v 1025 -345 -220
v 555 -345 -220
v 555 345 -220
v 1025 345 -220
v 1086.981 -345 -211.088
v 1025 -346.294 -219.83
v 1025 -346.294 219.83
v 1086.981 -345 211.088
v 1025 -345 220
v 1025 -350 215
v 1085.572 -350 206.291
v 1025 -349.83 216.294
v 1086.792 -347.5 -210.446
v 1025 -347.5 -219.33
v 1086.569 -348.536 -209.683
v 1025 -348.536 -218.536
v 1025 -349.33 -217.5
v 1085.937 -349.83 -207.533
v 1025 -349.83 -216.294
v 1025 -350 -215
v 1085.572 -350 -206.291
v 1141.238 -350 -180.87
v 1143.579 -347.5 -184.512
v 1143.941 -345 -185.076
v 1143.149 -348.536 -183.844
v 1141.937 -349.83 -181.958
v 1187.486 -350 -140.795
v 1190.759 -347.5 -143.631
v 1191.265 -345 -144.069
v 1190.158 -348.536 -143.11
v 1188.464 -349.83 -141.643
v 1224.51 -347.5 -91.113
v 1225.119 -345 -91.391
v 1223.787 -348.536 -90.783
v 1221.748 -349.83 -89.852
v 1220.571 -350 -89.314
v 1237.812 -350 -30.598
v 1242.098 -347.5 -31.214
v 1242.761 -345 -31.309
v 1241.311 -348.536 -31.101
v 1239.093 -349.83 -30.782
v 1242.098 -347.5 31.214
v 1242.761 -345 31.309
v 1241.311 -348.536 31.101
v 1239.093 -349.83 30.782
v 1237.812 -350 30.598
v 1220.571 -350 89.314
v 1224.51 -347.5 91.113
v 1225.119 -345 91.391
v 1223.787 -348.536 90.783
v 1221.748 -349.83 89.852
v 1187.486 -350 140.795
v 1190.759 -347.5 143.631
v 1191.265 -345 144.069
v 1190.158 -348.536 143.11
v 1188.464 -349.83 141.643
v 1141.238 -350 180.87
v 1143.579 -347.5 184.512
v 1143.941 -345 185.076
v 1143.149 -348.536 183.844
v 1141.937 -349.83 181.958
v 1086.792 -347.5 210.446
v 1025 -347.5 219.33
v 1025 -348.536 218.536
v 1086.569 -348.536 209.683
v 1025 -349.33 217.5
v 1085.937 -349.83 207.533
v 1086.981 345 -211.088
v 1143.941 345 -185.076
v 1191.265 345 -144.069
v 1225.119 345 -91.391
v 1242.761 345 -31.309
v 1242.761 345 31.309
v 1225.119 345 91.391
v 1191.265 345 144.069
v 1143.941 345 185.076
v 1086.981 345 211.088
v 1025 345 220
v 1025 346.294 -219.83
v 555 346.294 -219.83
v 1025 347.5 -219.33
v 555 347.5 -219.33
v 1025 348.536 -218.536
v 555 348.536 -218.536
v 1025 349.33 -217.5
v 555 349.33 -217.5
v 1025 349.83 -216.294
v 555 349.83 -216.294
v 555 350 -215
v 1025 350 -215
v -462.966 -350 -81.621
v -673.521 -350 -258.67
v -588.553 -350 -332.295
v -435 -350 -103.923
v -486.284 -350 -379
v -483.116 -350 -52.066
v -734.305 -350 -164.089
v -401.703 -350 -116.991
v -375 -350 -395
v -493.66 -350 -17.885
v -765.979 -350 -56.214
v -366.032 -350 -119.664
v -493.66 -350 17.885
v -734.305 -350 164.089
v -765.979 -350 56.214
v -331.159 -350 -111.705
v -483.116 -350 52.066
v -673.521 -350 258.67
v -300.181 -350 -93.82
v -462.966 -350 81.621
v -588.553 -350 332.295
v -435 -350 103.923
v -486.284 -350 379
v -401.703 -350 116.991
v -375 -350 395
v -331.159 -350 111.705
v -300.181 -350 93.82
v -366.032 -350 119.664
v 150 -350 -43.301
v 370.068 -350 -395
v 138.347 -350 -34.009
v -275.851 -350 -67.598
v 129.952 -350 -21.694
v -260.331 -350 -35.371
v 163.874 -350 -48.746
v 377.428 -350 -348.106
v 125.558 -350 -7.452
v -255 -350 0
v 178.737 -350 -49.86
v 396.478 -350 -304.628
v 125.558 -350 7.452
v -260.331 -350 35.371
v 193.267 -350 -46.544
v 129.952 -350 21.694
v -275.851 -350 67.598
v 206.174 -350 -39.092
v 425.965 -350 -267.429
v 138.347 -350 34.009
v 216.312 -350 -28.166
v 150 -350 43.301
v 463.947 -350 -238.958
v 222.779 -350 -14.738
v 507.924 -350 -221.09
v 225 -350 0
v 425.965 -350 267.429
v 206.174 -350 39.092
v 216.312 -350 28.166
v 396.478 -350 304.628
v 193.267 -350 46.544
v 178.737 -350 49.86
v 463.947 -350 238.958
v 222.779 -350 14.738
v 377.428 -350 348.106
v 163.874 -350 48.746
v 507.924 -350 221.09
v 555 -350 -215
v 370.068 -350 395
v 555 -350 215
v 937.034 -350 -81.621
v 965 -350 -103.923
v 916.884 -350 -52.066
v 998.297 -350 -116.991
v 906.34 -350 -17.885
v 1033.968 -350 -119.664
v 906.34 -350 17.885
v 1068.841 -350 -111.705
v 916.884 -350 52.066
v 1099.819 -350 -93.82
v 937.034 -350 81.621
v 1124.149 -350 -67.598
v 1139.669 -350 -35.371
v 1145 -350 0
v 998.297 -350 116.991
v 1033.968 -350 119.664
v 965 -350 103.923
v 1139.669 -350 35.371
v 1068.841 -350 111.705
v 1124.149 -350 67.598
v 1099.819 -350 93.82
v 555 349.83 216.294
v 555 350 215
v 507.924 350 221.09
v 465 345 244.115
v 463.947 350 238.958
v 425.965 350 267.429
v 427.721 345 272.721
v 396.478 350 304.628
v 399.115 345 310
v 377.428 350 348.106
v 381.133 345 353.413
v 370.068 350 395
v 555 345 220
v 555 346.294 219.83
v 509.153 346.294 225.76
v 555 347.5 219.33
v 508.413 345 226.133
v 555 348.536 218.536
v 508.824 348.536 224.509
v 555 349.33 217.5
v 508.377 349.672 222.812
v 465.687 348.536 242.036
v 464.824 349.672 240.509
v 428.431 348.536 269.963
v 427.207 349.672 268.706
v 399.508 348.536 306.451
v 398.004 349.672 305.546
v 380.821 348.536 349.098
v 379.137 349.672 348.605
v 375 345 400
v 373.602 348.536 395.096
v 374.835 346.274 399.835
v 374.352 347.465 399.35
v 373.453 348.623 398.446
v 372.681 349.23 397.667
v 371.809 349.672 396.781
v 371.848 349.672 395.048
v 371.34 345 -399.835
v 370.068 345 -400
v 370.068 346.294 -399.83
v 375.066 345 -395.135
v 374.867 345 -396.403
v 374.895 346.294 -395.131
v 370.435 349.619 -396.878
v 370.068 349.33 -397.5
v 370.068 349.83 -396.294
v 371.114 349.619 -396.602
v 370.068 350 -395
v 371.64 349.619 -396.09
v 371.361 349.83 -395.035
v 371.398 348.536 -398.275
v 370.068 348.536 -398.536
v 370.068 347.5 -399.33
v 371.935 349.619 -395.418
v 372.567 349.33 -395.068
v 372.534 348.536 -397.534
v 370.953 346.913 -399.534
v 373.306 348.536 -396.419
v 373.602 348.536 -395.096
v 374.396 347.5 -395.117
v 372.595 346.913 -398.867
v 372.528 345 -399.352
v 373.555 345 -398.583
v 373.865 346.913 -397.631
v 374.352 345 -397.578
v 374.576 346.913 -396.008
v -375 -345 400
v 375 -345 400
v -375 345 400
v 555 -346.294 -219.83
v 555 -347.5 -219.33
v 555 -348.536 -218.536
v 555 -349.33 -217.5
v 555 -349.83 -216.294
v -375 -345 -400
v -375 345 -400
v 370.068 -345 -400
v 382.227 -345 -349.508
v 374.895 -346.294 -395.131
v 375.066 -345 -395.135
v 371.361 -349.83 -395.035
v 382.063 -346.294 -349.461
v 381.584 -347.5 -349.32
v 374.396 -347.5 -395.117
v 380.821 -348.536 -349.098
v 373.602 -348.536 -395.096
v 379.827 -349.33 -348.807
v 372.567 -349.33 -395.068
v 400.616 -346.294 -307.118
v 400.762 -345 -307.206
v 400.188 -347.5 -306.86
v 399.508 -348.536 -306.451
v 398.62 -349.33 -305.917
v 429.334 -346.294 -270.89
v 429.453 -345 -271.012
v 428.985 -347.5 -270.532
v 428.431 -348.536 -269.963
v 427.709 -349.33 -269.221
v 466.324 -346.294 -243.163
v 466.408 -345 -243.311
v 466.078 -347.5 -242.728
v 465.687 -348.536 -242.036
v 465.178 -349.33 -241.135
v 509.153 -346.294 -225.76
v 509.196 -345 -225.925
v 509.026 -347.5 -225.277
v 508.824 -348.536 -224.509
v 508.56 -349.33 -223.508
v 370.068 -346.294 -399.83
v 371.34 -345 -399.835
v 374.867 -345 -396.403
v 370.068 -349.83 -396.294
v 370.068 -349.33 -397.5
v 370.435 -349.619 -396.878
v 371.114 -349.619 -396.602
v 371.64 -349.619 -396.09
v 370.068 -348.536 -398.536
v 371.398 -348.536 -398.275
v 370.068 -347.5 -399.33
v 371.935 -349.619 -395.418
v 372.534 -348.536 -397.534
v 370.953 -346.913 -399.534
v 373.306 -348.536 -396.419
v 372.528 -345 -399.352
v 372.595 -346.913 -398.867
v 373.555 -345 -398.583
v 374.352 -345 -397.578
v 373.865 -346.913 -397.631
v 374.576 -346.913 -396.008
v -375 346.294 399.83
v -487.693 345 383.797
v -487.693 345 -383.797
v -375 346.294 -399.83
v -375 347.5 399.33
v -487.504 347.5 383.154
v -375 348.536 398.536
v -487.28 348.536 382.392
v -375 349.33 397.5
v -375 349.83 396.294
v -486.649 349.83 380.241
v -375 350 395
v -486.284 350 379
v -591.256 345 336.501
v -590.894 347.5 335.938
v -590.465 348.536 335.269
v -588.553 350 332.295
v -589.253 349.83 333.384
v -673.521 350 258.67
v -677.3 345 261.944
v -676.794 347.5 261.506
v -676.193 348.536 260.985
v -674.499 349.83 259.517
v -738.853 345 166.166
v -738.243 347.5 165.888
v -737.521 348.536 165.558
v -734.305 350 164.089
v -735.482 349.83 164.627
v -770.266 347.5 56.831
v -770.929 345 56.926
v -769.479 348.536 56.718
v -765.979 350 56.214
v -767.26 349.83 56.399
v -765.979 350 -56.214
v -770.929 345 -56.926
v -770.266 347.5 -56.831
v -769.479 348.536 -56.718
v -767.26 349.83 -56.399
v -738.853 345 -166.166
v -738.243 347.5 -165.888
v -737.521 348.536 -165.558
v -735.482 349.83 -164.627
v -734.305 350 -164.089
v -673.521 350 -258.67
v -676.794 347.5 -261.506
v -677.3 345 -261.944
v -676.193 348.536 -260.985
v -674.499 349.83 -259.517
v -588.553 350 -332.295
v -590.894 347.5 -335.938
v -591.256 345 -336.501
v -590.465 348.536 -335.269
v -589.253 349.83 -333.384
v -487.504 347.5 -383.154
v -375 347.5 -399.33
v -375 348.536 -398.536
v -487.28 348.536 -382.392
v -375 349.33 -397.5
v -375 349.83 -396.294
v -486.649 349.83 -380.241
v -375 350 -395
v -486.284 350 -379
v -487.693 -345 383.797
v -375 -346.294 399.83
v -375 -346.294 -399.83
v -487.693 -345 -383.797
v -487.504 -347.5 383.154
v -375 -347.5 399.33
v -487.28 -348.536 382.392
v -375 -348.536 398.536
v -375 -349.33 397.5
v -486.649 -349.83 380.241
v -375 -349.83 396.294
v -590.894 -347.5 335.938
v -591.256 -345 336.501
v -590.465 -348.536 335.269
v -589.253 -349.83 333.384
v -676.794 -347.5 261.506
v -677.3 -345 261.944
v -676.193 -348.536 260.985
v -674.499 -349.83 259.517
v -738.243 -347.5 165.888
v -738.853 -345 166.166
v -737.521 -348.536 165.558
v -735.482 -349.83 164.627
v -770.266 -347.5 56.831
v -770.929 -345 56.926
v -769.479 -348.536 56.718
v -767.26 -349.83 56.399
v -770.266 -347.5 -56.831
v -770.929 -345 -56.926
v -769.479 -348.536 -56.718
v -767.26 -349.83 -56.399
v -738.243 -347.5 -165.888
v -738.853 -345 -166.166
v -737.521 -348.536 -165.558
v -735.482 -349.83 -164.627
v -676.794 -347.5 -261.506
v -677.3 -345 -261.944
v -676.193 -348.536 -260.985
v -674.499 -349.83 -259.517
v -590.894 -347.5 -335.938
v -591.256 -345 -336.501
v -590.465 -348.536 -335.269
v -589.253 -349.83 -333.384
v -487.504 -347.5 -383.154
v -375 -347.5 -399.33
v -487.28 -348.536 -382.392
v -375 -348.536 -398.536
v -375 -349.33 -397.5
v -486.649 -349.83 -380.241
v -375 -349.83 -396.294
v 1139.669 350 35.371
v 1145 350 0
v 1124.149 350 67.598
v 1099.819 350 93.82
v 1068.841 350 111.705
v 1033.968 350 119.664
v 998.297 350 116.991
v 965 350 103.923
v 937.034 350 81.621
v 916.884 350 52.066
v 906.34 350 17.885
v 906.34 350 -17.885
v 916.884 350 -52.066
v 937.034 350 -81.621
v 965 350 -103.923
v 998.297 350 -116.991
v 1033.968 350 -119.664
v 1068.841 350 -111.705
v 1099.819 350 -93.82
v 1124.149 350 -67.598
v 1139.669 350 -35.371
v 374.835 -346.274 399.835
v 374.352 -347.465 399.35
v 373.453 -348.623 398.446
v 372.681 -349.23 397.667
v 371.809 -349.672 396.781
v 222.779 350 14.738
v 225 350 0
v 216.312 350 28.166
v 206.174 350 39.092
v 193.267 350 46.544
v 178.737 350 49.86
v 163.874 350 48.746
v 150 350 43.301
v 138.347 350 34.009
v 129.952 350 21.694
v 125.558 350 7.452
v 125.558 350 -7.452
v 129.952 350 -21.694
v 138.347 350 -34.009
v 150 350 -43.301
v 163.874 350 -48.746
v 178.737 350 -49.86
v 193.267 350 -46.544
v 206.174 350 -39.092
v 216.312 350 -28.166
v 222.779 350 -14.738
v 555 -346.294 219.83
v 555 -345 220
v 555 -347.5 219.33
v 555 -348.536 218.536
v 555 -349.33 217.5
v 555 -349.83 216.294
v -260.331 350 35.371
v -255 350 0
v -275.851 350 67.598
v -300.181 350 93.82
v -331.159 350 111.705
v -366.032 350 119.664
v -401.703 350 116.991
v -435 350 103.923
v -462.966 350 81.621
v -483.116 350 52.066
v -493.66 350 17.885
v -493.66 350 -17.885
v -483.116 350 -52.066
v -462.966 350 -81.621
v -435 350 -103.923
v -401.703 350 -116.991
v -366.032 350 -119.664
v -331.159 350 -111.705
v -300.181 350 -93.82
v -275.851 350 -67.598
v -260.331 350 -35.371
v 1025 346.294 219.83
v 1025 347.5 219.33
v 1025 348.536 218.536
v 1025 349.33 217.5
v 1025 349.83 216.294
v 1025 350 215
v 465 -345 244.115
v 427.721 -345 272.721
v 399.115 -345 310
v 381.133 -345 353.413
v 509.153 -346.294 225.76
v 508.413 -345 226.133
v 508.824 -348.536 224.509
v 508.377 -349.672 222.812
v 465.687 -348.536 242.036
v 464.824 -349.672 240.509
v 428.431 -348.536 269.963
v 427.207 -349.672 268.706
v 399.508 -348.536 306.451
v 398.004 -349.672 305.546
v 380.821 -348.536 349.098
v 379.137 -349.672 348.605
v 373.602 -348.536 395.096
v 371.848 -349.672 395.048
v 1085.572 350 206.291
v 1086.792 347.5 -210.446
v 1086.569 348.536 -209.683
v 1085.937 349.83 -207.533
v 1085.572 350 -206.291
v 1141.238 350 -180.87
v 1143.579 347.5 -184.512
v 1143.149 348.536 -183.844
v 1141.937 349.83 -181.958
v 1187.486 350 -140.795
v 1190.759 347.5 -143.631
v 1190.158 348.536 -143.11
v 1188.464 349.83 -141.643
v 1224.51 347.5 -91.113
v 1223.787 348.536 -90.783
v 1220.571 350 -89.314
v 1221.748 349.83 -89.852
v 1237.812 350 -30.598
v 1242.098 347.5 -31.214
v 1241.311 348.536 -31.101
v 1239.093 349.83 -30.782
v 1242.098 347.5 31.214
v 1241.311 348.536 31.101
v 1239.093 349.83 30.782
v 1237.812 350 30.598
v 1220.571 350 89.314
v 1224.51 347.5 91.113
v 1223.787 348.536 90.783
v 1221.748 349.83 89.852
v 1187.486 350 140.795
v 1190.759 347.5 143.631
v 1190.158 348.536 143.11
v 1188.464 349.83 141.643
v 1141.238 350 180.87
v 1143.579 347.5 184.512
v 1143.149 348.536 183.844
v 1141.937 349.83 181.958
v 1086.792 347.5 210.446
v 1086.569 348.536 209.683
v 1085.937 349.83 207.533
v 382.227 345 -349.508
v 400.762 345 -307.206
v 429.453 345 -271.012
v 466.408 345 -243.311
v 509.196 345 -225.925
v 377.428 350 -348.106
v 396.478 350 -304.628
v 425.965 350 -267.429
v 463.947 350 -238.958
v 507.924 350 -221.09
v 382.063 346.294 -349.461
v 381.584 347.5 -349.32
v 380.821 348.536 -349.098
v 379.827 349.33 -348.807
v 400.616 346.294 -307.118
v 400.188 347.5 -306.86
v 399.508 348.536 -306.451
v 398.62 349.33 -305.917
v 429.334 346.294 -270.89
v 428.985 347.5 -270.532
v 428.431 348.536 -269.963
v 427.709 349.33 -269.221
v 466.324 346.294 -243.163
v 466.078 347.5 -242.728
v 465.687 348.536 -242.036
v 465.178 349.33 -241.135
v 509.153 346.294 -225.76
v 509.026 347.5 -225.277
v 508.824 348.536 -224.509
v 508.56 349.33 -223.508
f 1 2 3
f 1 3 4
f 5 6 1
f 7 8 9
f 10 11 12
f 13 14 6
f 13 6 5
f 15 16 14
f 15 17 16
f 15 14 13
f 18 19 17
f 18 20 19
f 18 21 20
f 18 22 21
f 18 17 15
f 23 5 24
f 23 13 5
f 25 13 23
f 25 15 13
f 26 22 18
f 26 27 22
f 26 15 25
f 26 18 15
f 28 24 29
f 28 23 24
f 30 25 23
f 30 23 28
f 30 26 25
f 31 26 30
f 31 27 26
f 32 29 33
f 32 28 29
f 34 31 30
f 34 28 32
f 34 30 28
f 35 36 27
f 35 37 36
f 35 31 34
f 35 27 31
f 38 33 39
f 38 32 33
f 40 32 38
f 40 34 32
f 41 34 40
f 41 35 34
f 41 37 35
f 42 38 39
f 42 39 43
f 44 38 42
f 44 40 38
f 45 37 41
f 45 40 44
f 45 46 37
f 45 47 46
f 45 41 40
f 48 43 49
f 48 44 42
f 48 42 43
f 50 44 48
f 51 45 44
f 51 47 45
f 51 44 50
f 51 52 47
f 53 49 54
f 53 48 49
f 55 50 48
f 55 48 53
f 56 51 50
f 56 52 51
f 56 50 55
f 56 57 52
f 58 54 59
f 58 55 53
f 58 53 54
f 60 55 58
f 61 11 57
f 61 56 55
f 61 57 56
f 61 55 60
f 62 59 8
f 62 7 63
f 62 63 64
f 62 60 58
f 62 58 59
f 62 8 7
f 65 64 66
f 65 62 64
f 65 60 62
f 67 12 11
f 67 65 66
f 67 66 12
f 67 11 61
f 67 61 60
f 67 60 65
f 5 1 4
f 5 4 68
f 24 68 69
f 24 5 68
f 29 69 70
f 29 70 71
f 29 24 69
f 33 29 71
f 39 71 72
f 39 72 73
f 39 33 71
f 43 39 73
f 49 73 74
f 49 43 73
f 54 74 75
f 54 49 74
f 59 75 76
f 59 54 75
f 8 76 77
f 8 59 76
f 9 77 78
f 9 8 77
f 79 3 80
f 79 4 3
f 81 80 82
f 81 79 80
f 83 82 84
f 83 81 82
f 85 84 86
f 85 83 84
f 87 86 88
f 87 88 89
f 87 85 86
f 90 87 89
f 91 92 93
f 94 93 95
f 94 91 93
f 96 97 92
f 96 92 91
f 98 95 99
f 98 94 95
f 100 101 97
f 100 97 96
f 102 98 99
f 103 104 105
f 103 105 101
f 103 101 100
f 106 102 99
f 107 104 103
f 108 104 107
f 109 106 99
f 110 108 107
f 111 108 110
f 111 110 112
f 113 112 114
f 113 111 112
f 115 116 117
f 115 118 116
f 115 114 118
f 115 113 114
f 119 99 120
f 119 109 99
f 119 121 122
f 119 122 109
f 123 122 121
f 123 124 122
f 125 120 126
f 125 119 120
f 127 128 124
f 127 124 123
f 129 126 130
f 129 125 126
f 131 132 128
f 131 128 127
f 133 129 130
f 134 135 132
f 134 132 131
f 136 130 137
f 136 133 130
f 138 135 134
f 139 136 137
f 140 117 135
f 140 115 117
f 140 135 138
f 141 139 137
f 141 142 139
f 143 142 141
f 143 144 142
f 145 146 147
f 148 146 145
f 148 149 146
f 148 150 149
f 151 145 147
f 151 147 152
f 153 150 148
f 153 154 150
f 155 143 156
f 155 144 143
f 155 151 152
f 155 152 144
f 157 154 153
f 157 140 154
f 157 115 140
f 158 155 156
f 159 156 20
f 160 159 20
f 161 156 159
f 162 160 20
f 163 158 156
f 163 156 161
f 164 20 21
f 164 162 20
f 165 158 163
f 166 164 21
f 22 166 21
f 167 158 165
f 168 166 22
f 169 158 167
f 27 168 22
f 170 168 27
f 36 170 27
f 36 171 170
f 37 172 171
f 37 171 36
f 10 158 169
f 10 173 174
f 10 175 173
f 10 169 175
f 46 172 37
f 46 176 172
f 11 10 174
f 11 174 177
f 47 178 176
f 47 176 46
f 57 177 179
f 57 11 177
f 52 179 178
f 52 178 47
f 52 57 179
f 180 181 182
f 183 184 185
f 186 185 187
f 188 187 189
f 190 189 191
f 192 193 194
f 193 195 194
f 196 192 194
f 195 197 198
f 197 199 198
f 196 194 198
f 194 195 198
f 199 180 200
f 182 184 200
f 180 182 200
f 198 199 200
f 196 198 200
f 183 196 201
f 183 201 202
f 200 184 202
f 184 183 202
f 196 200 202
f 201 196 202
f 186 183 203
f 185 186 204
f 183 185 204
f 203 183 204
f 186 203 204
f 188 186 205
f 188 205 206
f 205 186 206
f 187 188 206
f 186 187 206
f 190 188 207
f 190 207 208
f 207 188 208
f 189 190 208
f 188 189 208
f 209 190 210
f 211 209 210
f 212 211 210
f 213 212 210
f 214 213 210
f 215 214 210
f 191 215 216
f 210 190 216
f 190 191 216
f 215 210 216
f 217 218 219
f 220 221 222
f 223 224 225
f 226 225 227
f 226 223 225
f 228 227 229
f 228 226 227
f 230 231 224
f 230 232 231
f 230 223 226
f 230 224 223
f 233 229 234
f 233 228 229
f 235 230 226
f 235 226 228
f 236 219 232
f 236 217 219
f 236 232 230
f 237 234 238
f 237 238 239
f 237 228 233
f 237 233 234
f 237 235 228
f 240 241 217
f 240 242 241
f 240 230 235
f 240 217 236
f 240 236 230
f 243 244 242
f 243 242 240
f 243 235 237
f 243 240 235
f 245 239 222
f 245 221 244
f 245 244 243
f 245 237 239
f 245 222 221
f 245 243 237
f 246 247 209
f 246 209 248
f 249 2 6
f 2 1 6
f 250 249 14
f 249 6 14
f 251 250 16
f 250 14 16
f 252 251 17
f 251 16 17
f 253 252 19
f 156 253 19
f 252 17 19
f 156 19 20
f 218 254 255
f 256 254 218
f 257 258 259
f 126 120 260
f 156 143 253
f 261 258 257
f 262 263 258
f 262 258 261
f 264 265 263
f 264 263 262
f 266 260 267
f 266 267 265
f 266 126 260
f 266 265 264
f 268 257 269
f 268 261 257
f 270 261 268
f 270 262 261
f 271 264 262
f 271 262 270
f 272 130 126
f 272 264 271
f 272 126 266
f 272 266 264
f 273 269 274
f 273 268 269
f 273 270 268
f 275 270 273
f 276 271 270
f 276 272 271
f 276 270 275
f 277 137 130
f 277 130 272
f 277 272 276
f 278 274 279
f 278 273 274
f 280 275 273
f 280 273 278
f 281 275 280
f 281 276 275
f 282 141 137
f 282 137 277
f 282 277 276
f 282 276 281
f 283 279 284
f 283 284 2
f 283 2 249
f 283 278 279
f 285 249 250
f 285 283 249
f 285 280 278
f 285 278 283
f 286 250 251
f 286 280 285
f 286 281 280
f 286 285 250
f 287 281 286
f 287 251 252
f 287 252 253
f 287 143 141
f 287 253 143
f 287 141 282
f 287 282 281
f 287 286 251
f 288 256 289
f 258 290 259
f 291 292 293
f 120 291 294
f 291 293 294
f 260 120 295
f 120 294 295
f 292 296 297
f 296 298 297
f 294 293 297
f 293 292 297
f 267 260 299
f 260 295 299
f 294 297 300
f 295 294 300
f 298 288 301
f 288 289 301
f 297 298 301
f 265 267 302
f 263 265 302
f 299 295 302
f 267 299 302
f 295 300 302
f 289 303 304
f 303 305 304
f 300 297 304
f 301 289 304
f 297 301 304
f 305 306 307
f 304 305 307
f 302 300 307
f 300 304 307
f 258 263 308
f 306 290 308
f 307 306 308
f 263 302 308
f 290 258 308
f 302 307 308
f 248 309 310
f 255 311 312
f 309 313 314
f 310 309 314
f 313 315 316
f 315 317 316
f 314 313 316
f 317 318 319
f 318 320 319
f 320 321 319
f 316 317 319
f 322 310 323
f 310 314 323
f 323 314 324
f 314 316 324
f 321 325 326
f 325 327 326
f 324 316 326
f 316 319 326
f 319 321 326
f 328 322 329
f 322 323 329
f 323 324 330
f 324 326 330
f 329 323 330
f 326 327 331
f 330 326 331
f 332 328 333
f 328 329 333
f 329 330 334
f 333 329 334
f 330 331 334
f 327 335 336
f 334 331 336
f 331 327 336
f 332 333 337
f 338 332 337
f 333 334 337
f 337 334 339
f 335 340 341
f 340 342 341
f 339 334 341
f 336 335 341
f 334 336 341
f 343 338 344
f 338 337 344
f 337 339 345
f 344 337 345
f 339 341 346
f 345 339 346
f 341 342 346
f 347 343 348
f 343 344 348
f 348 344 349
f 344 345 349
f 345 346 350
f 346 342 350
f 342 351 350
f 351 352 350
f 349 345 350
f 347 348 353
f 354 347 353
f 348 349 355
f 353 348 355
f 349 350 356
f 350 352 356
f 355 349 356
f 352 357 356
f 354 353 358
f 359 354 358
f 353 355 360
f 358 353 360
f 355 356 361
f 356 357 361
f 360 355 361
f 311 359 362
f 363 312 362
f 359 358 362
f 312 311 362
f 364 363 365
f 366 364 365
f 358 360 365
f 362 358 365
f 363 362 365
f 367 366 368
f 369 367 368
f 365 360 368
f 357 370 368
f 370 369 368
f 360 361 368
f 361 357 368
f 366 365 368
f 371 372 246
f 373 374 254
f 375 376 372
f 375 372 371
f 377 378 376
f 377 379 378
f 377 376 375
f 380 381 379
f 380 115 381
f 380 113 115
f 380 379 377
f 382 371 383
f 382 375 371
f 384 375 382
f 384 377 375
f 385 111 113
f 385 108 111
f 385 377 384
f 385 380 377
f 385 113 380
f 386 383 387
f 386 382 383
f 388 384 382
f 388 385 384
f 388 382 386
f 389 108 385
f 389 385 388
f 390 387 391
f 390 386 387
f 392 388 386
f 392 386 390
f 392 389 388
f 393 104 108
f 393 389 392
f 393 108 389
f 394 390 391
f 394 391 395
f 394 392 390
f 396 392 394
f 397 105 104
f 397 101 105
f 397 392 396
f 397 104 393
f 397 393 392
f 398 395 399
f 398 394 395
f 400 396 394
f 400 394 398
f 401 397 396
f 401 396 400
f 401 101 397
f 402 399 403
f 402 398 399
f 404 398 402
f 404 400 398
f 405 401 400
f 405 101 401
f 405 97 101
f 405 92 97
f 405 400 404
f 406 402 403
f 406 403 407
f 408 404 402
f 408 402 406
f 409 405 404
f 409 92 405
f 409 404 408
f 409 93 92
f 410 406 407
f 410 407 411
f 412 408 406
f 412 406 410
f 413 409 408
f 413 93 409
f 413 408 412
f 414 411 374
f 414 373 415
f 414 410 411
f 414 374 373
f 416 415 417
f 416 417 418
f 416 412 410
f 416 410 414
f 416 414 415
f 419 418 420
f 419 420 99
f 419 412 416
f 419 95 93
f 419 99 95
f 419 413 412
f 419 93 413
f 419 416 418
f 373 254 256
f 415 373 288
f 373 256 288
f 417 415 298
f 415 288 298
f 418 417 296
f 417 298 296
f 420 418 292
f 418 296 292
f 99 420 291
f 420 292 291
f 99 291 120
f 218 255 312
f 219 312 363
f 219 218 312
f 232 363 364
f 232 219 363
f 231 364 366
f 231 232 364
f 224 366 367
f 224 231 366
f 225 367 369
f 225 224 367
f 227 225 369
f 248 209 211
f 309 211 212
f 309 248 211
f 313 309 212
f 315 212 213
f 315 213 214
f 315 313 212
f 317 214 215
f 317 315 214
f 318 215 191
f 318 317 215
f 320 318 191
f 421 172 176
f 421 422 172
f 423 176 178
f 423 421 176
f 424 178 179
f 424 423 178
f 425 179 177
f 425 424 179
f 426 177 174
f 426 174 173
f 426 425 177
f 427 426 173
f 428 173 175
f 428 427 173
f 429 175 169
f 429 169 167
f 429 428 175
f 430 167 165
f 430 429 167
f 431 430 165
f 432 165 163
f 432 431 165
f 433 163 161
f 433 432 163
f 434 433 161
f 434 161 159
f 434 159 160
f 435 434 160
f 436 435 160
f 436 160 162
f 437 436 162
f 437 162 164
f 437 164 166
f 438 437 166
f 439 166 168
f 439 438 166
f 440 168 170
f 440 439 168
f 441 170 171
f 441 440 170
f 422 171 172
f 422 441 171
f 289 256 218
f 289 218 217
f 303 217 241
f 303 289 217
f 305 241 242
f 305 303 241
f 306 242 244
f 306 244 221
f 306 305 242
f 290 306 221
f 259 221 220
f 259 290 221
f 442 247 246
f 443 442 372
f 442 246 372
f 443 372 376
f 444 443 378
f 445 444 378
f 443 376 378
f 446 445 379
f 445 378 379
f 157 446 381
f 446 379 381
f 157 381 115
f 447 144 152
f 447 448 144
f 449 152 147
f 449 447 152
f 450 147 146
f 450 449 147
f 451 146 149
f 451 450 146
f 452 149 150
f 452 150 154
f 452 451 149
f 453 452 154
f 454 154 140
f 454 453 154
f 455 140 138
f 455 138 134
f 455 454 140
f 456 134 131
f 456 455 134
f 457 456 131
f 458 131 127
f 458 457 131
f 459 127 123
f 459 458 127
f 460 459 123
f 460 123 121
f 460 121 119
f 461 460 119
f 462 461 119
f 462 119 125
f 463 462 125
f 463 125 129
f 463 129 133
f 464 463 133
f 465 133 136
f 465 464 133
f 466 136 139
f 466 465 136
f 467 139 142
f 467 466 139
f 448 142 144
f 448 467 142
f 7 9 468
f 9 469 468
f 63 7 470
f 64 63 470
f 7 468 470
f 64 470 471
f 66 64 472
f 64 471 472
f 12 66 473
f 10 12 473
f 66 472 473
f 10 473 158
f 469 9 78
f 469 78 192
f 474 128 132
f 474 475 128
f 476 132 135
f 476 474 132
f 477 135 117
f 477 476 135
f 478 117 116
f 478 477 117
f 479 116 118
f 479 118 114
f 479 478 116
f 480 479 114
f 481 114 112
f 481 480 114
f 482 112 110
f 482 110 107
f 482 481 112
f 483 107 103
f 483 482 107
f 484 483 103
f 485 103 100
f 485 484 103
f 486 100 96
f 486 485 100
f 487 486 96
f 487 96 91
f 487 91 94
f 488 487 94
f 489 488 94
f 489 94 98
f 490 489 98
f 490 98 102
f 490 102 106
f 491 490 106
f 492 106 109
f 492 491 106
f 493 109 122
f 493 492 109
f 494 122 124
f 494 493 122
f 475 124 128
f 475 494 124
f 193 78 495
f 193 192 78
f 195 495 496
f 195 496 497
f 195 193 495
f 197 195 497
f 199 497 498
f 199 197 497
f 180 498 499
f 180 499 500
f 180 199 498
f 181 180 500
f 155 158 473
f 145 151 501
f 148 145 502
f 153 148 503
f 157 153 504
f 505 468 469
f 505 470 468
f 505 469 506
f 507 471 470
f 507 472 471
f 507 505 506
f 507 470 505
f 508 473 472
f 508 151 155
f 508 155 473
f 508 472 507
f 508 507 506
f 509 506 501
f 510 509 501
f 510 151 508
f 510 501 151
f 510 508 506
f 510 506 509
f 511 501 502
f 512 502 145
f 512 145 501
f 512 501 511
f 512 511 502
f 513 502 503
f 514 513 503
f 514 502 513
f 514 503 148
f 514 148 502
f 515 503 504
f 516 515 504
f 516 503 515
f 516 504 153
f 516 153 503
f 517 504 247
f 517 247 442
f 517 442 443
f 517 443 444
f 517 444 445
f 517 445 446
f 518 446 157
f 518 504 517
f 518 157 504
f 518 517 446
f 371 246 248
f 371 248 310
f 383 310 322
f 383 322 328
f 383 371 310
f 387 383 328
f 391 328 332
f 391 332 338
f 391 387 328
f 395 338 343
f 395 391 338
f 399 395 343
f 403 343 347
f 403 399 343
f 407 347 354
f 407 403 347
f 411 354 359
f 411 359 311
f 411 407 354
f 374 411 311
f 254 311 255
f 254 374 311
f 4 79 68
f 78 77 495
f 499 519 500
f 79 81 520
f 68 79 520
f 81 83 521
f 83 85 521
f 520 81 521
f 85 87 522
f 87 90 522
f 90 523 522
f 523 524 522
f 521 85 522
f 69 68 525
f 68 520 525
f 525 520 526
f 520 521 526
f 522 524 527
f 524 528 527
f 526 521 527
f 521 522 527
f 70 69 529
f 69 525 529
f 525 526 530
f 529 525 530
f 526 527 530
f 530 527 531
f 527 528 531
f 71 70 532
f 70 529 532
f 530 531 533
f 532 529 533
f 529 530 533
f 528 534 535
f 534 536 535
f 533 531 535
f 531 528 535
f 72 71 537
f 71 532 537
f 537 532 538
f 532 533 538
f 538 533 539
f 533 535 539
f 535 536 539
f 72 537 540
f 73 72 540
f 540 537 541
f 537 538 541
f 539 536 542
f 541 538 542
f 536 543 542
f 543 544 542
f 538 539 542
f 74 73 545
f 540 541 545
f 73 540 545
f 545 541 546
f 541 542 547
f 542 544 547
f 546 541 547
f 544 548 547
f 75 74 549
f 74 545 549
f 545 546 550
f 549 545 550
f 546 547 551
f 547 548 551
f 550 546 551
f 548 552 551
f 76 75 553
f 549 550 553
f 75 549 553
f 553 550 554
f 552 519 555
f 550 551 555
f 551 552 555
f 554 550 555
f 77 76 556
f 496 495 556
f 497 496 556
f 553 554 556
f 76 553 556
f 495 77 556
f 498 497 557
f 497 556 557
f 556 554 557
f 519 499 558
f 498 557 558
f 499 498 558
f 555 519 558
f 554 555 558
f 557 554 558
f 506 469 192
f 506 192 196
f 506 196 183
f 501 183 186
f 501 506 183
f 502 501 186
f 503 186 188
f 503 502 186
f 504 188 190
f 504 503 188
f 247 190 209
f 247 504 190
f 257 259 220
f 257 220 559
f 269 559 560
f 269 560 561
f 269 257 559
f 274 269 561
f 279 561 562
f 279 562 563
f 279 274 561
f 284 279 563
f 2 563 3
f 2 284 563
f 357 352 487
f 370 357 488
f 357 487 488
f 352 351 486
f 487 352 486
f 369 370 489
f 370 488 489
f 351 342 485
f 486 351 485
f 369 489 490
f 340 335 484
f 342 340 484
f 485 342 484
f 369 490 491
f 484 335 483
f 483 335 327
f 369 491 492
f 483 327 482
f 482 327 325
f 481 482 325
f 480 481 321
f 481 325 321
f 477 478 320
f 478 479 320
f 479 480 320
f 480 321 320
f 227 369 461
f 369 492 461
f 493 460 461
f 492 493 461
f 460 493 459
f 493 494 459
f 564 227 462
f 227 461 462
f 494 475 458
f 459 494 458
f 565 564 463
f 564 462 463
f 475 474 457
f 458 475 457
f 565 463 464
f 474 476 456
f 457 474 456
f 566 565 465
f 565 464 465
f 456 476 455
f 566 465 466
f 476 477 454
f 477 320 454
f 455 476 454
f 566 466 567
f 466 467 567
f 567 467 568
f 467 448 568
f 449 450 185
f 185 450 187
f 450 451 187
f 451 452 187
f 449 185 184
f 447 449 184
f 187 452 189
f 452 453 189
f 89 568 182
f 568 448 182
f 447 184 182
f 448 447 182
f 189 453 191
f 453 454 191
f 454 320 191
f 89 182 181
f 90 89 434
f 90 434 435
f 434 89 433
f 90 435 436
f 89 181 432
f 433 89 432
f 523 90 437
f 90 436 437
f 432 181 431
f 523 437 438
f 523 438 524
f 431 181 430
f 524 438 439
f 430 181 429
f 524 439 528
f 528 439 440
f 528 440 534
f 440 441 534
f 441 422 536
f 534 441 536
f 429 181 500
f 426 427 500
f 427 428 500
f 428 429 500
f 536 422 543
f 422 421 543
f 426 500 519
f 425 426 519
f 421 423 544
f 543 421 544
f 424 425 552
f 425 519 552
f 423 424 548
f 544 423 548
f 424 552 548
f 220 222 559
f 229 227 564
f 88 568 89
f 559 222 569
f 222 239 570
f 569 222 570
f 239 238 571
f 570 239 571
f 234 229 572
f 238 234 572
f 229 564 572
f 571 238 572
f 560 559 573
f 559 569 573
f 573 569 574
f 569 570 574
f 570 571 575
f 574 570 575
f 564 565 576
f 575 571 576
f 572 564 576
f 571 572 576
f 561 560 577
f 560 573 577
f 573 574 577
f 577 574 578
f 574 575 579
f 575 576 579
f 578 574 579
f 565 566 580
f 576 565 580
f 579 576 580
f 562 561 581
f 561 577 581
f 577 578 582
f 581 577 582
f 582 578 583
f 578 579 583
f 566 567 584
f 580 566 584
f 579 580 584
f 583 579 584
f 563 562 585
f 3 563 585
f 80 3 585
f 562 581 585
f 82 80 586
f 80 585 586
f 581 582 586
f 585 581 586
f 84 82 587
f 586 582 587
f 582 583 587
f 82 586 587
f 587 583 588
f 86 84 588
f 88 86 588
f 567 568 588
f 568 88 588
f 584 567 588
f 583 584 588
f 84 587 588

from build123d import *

# Parameters (mm, degrees)
F0_R     = 120
F0_R_2   = 50
F1_DEPTH = 350
F2_R     = 5


with BuildPart() as f1:
    # F0 (on Front) → F1 (new body, symmetric)
    with BuildSketch(Plane.XZ):
        with BuildLine():
            Line((-375, -400), (375, -400))
            ThreePointArc((375, -400), (427.720779, -272.720779), (555, -220))
            Line((555, -220), (1025, -220))
            ThreePointArc((1025, -220), (1245, 0), (1025, 220))
            Line((1025, 220), (555, 220))
            ThreePointArc((555, 220), (427.720779, 272.720779), (375, 400))
            Line((375, 400), (-375, 400))
            ThreePointArc((-375, 400), (-775, 0), (-375, -400))
        make_face()
        with Locations((-375, 0)):
            Circle(F0_R, mode=Mode.SUBTRACT)
        with Locations((175, 0)):
            Circle(F0_R_2, mode=Mode.SUBTRACT)
        with Locations((1025, 0)):
            Circle(F0_R, mode=Mode.SUBTRACT)
    extrude(amount=F1_DEPTH, both=True)

    # F2
    f2_edges = [f1.edges().sort_by_distance(p)[0] for p in [
        (-775, -350, 0),
        (0, -350, 400),
        (427.720779, -350, 272.720779),
        (790, -350, 220),
        (1245, -350, 0),
        (790, -350, -220),
        (427.720779, -350, -272.720779),
        (0, -350, -400),
        (-775, 350, 0),
        (0, 350, 400),
        (427.720779, 350, 272.720779),
        (790, 350, 220),
        (1245, 350, 0),
        (375, 0, -400),
        (790, 350, -220),
        (427.720779, 350, -272.720779),
        (0, 350, -400),
    ]]
    fillet(f2_edges, radius=F2_R)


solid = f1.part
